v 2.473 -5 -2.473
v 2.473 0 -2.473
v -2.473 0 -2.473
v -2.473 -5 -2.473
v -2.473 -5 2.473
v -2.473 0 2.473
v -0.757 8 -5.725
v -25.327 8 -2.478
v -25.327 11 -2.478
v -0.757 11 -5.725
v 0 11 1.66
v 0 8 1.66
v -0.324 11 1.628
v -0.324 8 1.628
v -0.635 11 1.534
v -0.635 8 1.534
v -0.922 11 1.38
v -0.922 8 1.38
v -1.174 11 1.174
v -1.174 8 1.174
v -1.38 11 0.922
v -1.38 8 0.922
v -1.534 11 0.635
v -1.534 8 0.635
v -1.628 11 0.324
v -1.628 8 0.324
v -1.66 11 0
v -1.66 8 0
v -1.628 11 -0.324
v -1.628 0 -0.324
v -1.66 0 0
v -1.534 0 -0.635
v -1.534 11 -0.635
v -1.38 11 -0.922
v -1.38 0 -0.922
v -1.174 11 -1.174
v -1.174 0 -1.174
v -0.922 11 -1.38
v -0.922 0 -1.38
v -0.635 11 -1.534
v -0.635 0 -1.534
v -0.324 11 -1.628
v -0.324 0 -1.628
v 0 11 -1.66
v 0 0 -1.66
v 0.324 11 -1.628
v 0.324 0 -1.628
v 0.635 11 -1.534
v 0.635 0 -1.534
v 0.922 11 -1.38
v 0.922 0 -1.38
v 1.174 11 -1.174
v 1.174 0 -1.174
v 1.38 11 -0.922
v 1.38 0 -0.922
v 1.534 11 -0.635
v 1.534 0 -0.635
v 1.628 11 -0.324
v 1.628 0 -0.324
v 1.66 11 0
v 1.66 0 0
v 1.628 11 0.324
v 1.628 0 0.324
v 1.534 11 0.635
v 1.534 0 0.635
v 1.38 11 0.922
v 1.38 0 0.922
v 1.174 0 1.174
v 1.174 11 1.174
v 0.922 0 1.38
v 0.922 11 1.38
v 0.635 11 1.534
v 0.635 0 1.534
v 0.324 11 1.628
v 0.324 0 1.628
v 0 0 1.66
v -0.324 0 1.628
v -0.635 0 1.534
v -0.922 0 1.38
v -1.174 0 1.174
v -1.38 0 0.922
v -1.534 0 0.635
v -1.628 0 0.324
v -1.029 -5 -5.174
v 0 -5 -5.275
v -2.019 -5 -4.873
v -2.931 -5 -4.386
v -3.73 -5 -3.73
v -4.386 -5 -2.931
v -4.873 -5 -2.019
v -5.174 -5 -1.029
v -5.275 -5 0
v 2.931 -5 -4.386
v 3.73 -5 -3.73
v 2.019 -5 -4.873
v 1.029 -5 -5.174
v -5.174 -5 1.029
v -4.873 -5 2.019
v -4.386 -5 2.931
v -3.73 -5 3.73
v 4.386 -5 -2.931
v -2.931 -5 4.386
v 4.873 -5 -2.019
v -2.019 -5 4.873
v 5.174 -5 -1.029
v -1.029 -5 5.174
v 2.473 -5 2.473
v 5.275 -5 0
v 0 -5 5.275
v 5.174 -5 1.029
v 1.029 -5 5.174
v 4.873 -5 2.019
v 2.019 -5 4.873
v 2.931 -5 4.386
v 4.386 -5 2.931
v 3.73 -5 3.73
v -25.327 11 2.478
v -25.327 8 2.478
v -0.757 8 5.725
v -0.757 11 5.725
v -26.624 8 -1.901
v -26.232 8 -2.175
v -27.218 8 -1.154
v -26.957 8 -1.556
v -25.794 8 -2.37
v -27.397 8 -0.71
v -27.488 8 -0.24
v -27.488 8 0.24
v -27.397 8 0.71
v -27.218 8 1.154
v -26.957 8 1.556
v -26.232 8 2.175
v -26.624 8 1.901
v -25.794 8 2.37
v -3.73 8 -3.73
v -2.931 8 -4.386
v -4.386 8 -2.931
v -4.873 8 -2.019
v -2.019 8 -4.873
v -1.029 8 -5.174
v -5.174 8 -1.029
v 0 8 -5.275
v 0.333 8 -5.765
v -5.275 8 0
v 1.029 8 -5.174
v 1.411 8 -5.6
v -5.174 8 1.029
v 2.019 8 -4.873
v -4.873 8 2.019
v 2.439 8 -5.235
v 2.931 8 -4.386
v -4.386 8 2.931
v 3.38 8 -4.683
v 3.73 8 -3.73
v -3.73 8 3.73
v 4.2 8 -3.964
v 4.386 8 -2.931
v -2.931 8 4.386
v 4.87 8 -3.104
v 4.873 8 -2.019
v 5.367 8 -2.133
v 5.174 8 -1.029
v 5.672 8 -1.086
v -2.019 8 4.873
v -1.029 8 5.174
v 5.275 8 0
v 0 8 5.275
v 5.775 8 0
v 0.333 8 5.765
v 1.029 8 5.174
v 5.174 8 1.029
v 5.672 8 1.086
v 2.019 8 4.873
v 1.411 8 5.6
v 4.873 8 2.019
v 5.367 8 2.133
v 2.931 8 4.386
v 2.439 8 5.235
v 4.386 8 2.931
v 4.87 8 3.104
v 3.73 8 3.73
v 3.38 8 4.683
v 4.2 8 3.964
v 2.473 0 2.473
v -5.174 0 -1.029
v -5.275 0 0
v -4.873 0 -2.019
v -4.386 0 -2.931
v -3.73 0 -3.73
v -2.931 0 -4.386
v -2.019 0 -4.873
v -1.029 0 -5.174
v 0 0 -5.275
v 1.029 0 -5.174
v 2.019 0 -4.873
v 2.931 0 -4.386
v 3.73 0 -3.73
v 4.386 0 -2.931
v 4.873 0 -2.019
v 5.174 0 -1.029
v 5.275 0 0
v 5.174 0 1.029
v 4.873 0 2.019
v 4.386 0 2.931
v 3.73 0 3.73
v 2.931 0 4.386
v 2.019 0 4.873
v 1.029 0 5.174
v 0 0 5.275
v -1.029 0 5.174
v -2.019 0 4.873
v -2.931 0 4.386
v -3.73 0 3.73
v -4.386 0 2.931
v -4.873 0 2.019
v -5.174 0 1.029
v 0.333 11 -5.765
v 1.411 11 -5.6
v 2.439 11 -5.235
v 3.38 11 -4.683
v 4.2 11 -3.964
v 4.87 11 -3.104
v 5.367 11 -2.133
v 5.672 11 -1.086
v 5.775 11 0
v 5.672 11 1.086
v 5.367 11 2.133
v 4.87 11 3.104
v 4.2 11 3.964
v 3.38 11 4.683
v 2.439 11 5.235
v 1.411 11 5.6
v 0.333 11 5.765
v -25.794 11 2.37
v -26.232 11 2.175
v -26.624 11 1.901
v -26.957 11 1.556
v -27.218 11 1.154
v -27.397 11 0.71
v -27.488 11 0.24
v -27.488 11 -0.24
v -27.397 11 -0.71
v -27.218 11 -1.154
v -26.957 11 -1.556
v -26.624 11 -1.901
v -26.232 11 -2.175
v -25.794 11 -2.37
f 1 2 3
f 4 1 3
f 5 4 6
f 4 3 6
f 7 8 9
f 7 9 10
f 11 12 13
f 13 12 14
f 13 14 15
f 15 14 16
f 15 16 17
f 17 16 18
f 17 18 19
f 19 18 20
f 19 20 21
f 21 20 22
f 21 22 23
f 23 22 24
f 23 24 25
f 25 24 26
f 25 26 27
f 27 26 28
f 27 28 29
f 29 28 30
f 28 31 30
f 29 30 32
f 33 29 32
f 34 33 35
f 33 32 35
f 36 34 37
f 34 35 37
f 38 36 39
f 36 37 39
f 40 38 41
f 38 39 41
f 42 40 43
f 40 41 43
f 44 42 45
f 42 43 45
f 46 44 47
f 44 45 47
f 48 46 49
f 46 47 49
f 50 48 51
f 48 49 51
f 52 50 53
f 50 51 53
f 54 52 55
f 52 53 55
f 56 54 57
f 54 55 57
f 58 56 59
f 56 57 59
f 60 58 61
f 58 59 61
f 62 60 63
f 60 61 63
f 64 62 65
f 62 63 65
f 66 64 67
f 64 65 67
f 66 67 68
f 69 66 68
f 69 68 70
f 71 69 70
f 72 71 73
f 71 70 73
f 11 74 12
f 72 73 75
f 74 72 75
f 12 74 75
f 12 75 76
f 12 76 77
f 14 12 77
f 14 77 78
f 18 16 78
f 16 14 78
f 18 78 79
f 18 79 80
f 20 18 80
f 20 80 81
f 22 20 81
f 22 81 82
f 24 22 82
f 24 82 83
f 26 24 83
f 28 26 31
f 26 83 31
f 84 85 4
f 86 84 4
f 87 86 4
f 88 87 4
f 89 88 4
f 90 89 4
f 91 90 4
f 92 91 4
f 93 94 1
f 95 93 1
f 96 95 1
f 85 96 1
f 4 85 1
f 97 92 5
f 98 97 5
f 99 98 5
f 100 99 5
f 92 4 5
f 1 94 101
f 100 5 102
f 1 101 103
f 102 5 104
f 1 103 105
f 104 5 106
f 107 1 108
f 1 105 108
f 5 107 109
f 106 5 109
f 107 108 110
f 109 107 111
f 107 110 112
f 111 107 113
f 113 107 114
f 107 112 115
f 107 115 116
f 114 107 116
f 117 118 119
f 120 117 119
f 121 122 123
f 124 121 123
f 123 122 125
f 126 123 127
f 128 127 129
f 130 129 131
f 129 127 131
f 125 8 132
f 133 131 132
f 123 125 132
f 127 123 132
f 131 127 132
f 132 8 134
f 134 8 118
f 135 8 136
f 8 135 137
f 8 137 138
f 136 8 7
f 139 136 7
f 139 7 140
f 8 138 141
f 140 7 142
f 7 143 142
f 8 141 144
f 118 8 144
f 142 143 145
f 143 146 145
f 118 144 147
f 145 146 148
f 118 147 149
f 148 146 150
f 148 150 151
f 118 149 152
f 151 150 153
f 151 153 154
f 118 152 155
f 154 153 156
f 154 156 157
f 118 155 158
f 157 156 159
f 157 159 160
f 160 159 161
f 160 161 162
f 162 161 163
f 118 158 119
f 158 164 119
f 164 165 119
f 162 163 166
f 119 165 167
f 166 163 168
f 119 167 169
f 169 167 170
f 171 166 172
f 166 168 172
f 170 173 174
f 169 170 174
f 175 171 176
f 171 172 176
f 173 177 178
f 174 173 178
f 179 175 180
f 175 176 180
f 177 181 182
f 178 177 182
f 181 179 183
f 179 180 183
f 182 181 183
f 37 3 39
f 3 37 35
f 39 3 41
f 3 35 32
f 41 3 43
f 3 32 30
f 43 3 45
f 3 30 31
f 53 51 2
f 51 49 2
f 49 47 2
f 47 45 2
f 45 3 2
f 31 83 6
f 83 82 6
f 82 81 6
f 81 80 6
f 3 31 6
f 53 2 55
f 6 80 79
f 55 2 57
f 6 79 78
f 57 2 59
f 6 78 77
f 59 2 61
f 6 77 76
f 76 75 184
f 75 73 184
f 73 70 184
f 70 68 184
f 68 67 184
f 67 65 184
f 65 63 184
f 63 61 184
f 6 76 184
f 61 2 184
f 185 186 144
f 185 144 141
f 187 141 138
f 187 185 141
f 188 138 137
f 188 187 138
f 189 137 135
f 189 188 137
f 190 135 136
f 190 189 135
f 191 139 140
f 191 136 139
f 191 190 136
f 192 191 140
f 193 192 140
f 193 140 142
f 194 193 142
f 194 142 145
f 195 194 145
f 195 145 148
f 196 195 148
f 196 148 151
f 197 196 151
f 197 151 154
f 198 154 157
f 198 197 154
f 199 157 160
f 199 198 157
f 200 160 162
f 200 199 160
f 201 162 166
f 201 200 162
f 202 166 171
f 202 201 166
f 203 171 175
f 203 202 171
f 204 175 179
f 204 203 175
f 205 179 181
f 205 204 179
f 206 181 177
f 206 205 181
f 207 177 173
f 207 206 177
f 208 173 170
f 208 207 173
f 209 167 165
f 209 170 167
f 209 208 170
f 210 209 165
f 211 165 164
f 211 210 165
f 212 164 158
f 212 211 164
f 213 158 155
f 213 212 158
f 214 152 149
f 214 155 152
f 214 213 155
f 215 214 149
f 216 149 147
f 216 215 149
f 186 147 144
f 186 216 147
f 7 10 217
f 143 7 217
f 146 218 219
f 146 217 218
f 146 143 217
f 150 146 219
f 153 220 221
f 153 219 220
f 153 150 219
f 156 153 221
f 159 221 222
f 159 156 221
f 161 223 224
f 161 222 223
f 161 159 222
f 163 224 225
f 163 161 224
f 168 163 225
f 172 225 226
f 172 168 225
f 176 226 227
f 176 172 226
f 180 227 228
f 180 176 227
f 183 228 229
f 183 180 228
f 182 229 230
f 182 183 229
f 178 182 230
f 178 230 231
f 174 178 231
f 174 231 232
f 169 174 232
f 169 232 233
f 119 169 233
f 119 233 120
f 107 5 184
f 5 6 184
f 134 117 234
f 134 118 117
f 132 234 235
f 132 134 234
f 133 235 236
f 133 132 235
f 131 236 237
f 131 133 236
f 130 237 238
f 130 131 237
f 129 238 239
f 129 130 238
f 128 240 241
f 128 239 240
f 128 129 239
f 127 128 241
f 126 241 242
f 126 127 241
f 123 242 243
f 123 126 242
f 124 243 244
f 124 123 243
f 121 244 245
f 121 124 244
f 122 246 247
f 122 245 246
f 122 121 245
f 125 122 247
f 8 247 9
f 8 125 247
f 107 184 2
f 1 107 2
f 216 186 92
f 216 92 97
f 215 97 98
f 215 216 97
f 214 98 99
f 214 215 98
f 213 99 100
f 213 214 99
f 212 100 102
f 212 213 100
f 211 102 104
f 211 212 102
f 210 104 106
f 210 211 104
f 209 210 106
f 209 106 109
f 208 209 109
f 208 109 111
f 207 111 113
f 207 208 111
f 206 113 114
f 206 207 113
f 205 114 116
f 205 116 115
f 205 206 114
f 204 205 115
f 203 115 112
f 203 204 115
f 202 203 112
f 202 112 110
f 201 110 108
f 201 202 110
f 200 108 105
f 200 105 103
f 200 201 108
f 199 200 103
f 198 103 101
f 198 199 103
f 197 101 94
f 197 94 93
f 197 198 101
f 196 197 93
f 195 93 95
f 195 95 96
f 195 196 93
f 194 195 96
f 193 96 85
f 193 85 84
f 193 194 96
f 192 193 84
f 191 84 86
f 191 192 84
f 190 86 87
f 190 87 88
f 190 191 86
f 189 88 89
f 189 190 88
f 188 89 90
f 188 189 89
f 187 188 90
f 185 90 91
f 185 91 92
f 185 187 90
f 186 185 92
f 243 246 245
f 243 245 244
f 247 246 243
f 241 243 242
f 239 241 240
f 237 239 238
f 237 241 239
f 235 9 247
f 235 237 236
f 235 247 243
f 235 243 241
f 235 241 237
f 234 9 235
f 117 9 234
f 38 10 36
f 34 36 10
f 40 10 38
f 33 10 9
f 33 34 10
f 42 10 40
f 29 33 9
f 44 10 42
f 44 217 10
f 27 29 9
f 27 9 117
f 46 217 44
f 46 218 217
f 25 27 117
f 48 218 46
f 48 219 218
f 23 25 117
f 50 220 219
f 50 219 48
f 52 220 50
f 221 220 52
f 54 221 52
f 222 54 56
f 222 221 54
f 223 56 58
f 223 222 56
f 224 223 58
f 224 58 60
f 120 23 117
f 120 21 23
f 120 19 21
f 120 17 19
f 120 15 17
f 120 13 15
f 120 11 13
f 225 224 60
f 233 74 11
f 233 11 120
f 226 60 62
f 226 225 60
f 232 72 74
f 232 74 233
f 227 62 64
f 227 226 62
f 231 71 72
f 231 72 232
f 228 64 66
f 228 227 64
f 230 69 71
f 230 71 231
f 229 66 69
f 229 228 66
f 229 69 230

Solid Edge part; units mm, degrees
sketch "Sketch1" plane through (0, 0, 0) normal (0, 1, 0) x (-1, 0, 0)
  circle A0 centre (0, 0) radius 5.275
  circle A1 centre (0, 0) radius 1.66
  dimension "D1" = 0.5
  dimension "D2" = 0.1
extrude "Protrusion1" add sketch "Sketch1" along normal blind 8
sketch "Sketch2" plane through (0, 8, 0) normal (0, 1, 0) x (0, 0, 1)
  arc A0 (5.7252, -0.7565) -> (-5.7252, -0.7565) centre (0, 0) ccw
  line L0 (-2.4785, -25.3275) -> (-5.7252, -0.7565)
  arc A1 (-2.4785, -25.3275) -> (2.4785, -25.3275) centre (0, -25) ccw
  line L1 (2.4785, -25.3275) -> (5.7252, -0.7565)
  circle A2 centre (0, 0) radius 1.66
  dimension "D1" = 25
extrude "ExtrudedProtrusion_2" add sketch "Sketch2" along normal blind 3
sketch "Sketch3" plane through (0, 0, 0) normal (0, 1, 0) x (-1, 0, 0)
  line L0 (2.4732, 2.4732) -> (-2.4732, 2.4732)
  line L1 (-2.4732, 2.4732) -> (-2.4732, -2.4732)
  line L2 (-2.4732, -2.4732) -> (2.4732, -2.4732)
  line L3 (2.4732, -2.4732) -> (2.4732, 2.4732)
  circle A0 centre (0, 0) radius 5.275
  dimension "D1" = 0.5
  dimension "D2" = 0.1
extrude "ExtrudedProtrusion_5" add sketch "Sketch3" against normal blind 5
